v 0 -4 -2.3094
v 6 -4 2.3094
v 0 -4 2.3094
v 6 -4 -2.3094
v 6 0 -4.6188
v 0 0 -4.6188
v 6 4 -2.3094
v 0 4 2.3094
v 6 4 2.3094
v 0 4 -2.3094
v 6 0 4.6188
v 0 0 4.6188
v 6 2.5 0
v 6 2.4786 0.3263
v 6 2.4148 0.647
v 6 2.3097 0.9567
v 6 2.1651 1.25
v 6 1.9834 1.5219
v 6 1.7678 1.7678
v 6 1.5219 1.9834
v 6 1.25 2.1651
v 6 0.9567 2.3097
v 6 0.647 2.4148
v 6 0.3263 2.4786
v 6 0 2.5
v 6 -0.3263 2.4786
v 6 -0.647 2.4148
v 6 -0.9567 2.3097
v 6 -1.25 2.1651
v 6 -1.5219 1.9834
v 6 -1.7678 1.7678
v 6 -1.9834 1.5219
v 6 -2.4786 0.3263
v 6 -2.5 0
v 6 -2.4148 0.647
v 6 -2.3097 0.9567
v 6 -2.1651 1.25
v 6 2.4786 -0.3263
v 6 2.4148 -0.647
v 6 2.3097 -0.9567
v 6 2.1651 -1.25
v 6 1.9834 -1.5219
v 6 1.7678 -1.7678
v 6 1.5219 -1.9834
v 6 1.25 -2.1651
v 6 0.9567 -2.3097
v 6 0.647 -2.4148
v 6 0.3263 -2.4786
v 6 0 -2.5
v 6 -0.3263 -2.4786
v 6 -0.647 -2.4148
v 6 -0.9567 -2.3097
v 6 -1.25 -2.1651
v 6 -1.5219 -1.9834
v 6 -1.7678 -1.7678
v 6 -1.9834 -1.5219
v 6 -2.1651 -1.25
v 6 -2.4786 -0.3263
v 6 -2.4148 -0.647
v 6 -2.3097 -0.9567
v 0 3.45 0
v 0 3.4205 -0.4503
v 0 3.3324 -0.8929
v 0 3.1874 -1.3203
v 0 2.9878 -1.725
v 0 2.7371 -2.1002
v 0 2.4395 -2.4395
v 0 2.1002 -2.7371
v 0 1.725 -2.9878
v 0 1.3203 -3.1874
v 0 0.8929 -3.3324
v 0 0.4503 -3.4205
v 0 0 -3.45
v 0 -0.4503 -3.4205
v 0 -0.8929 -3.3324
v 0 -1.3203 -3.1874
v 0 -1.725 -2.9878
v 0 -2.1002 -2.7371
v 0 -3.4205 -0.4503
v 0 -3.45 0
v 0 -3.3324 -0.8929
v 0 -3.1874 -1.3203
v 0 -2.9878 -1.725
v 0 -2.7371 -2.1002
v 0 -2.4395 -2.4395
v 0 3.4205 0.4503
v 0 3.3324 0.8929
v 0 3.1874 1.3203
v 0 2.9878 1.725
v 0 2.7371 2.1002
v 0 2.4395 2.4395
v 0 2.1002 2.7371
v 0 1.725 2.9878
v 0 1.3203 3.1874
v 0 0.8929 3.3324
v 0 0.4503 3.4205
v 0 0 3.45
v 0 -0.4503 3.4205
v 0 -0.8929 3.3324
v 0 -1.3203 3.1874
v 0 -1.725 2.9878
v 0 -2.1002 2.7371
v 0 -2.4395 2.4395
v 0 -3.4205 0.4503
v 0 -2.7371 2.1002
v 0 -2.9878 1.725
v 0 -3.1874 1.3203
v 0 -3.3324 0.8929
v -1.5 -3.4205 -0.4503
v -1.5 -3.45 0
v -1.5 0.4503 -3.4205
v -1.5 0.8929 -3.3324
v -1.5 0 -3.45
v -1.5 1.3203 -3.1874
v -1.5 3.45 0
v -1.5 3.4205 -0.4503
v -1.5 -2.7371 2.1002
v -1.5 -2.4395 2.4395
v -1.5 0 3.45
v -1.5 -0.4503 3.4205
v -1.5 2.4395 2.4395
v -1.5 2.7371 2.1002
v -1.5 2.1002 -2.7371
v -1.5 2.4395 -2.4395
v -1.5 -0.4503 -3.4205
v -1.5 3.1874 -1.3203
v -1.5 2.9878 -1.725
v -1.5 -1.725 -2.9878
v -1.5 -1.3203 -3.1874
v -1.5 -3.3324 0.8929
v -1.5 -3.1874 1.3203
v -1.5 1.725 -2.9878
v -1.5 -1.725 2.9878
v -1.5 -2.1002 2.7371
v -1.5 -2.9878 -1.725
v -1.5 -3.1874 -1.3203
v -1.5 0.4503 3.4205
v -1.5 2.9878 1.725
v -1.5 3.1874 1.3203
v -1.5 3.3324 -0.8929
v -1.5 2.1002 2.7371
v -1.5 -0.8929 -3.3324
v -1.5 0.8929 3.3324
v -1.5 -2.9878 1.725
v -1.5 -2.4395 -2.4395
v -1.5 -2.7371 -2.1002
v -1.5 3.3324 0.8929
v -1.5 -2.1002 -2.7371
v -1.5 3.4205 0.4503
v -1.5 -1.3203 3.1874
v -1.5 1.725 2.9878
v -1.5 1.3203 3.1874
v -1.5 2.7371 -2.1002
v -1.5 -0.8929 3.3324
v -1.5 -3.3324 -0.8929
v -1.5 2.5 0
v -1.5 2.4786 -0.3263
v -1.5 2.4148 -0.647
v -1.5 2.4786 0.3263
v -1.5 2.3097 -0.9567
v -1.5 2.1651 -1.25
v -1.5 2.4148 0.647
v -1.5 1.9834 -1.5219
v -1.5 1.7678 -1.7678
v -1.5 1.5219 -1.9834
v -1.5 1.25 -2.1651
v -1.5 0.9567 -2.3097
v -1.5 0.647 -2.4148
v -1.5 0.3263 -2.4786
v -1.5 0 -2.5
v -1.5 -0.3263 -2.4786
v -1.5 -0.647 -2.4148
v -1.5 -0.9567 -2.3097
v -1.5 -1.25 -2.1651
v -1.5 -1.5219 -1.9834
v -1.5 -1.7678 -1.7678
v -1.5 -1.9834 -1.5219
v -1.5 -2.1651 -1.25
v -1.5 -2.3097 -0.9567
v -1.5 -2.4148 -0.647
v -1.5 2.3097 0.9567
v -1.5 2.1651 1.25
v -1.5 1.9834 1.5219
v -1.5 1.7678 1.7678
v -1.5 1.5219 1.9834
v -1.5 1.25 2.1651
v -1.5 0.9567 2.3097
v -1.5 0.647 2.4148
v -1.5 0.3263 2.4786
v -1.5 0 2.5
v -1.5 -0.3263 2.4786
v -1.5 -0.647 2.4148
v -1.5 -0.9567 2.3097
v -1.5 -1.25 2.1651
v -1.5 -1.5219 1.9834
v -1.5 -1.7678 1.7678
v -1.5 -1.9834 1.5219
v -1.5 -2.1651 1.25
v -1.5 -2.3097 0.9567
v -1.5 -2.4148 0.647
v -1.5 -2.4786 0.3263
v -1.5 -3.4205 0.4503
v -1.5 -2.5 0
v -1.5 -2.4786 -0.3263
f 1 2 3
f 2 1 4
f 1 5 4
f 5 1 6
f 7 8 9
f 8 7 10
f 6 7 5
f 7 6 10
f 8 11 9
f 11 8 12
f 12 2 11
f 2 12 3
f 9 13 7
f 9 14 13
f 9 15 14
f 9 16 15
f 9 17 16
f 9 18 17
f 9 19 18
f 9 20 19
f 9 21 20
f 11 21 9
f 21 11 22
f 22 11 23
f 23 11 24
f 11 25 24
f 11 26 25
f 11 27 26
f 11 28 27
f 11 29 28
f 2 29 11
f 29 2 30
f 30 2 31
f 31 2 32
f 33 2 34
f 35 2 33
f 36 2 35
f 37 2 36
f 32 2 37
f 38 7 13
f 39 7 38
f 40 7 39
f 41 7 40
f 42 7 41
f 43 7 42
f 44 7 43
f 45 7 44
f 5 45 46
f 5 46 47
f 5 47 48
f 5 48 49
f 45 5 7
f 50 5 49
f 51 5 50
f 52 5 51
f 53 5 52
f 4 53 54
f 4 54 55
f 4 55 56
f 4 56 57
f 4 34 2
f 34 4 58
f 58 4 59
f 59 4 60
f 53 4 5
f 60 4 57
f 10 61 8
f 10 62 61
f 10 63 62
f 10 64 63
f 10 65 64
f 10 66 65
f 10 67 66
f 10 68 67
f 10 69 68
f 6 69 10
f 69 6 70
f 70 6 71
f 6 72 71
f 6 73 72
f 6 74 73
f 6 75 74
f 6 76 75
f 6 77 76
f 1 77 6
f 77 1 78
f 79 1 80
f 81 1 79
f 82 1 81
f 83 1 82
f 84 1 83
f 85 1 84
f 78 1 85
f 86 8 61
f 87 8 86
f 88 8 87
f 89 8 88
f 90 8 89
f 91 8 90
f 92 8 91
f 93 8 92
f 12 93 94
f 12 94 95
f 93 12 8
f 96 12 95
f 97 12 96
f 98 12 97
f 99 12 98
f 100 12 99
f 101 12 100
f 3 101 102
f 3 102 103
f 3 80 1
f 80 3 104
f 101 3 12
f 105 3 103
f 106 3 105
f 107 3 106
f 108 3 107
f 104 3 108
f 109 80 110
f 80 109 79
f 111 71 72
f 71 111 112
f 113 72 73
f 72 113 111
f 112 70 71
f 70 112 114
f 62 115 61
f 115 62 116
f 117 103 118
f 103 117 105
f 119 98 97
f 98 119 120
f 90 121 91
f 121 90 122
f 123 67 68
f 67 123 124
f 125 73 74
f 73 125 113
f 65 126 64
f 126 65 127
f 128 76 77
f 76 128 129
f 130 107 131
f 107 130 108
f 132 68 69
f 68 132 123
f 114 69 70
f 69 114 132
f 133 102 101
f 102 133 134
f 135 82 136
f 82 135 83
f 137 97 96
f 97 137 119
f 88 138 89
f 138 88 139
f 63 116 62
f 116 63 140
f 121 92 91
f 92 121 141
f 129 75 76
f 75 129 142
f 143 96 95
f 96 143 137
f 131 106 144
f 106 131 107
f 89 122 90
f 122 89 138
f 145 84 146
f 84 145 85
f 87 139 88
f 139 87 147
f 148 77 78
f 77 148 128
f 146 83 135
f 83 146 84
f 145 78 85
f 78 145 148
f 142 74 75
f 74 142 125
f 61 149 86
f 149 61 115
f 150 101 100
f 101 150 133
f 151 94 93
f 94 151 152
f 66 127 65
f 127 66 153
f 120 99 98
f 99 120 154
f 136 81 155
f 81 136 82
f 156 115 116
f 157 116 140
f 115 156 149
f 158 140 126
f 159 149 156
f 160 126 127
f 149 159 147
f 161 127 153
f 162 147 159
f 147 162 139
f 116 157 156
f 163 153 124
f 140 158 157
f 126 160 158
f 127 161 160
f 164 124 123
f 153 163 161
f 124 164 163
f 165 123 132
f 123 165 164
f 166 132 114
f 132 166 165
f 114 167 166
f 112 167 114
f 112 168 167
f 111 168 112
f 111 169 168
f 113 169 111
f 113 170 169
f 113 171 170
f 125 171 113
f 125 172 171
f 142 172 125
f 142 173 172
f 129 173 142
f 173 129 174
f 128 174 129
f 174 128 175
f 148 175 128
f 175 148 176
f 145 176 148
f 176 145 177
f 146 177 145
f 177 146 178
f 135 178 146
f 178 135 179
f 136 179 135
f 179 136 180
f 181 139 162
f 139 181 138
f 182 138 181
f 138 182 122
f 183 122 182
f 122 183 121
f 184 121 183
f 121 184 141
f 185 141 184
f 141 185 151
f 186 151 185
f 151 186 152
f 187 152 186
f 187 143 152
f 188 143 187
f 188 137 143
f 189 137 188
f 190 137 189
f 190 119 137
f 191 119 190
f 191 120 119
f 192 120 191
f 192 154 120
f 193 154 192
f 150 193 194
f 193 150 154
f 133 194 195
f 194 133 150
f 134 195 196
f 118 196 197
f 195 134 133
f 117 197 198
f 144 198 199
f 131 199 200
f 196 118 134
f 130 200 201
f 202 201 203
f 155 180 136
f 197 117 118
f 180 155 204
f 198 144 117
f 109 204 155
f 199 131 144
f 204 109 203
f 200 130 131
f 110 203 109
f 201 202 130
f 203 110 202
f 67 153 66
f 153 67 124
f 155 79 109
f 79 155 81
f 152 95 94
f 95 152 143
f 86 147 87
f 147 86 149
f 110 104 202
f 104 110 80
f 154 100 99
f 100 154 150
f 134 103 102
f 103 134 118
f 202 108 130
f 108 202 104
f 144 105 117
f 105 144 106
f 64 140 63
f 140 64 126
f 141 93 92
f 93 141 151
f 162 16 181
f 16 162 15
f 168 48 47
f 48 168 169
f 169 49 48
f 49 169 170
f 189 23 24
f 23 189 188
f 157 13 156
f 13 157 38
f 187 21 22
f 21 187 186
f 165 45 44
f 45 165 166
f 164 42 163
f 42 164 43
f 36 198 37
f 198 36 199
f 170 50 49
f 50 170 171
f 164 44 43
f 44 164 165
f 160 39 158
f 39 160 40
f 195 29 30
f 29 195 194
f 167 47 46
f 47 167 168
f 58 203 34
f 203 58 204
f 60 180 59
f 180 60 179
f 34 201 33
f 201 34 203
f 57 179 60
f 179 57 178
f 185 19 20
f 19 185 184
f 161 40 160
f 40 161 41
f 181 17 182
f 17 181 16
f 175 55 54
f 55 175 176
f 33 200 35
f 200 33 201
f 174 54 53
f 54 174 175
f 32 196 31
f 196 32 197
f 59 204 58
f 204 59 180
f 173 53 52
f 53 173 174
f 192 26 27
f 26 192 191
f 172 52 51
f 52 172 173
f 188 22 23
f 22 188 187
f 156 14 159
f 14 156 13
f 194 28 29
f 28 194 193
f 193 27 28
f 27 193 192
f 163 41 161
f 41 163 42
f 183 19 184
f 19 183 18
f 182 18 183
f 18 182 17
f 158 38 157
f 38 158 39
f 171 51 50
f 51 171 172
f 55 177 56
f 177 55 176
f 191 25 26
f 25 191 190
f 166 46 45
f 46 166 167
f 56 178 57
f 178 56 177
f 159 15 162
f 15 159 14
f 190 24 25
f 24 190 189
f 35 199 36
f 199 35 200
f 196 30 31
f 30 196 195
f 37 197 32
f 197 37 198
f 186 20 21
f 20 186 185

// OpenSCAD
// file: ../../conf/constants.scad
/**********************************************************************************************************************
 **
 ** conf/constants.scad
 **
 ** This file contains constants and aliases used for the part size definitions.
 **
 **********************************************************************************************************************/

/**
 * The alias names for the rails.
 * A is the "front left" rail, B the "front right" rail, C the back rail.
 * These constants are also used for the sides of the frame and the effector; in this case, side A is the one 
 * opposing rail A.
 */
A = 0;
B = 1;
C = 2;

/**
 * Aliases for metric screw/nut sizes.
 */
M2 = 2;
M3 = 3;
M4 = 4;
M5 = 5;
M8 = 8;

/** 
 * Aliases for NEMA stepper motors.
 */
NEMA14 = 14;
NEMA17 = 17;
NEMA23 = 23;
// main file
/**********************************************************************************************************************
 **
 ** parts/vitamins/vwheel_spacer.scad
 **
 ** This file renders the eccentric spacer used to adjust the V-Wheels. Note that the center hole is not actually
 ** off-center in this model.
 **
 **********************************************************************************************************************/

use <../../conf/part_sizes.scad>

// see https://en.wikibooks.org/wiki/OpenSCAD_User_Manual/undersized_circular_objects
module cylinder_outer(height,radius,fn){
	fudge = 1/cos(180/fn);
	cylinder(h=height,r=radius*fudge,$fn=fn);
}

rotate([0, 90, 0])
	difference() {
		union() {
			cylinder_outer(height = vwheel_spacer_hex_height(), radius = vwheel_spacer_hex_size() / 2, fn = 6);
			translate([0, 0, -vwheel_spacer_inset_height()])
				cylinder(h = vwheel_spacer_inset_height(), d = vwheel_spacer_inset_diameter(), $fn = 48);
		}
		translate([0, 0, -vwheel_spacer_inset_height()])
			cylinder(d = vwheel_spacer_bore_diameter(), h = vwheel_spacer_total_height(), $fn = 48);
	}
